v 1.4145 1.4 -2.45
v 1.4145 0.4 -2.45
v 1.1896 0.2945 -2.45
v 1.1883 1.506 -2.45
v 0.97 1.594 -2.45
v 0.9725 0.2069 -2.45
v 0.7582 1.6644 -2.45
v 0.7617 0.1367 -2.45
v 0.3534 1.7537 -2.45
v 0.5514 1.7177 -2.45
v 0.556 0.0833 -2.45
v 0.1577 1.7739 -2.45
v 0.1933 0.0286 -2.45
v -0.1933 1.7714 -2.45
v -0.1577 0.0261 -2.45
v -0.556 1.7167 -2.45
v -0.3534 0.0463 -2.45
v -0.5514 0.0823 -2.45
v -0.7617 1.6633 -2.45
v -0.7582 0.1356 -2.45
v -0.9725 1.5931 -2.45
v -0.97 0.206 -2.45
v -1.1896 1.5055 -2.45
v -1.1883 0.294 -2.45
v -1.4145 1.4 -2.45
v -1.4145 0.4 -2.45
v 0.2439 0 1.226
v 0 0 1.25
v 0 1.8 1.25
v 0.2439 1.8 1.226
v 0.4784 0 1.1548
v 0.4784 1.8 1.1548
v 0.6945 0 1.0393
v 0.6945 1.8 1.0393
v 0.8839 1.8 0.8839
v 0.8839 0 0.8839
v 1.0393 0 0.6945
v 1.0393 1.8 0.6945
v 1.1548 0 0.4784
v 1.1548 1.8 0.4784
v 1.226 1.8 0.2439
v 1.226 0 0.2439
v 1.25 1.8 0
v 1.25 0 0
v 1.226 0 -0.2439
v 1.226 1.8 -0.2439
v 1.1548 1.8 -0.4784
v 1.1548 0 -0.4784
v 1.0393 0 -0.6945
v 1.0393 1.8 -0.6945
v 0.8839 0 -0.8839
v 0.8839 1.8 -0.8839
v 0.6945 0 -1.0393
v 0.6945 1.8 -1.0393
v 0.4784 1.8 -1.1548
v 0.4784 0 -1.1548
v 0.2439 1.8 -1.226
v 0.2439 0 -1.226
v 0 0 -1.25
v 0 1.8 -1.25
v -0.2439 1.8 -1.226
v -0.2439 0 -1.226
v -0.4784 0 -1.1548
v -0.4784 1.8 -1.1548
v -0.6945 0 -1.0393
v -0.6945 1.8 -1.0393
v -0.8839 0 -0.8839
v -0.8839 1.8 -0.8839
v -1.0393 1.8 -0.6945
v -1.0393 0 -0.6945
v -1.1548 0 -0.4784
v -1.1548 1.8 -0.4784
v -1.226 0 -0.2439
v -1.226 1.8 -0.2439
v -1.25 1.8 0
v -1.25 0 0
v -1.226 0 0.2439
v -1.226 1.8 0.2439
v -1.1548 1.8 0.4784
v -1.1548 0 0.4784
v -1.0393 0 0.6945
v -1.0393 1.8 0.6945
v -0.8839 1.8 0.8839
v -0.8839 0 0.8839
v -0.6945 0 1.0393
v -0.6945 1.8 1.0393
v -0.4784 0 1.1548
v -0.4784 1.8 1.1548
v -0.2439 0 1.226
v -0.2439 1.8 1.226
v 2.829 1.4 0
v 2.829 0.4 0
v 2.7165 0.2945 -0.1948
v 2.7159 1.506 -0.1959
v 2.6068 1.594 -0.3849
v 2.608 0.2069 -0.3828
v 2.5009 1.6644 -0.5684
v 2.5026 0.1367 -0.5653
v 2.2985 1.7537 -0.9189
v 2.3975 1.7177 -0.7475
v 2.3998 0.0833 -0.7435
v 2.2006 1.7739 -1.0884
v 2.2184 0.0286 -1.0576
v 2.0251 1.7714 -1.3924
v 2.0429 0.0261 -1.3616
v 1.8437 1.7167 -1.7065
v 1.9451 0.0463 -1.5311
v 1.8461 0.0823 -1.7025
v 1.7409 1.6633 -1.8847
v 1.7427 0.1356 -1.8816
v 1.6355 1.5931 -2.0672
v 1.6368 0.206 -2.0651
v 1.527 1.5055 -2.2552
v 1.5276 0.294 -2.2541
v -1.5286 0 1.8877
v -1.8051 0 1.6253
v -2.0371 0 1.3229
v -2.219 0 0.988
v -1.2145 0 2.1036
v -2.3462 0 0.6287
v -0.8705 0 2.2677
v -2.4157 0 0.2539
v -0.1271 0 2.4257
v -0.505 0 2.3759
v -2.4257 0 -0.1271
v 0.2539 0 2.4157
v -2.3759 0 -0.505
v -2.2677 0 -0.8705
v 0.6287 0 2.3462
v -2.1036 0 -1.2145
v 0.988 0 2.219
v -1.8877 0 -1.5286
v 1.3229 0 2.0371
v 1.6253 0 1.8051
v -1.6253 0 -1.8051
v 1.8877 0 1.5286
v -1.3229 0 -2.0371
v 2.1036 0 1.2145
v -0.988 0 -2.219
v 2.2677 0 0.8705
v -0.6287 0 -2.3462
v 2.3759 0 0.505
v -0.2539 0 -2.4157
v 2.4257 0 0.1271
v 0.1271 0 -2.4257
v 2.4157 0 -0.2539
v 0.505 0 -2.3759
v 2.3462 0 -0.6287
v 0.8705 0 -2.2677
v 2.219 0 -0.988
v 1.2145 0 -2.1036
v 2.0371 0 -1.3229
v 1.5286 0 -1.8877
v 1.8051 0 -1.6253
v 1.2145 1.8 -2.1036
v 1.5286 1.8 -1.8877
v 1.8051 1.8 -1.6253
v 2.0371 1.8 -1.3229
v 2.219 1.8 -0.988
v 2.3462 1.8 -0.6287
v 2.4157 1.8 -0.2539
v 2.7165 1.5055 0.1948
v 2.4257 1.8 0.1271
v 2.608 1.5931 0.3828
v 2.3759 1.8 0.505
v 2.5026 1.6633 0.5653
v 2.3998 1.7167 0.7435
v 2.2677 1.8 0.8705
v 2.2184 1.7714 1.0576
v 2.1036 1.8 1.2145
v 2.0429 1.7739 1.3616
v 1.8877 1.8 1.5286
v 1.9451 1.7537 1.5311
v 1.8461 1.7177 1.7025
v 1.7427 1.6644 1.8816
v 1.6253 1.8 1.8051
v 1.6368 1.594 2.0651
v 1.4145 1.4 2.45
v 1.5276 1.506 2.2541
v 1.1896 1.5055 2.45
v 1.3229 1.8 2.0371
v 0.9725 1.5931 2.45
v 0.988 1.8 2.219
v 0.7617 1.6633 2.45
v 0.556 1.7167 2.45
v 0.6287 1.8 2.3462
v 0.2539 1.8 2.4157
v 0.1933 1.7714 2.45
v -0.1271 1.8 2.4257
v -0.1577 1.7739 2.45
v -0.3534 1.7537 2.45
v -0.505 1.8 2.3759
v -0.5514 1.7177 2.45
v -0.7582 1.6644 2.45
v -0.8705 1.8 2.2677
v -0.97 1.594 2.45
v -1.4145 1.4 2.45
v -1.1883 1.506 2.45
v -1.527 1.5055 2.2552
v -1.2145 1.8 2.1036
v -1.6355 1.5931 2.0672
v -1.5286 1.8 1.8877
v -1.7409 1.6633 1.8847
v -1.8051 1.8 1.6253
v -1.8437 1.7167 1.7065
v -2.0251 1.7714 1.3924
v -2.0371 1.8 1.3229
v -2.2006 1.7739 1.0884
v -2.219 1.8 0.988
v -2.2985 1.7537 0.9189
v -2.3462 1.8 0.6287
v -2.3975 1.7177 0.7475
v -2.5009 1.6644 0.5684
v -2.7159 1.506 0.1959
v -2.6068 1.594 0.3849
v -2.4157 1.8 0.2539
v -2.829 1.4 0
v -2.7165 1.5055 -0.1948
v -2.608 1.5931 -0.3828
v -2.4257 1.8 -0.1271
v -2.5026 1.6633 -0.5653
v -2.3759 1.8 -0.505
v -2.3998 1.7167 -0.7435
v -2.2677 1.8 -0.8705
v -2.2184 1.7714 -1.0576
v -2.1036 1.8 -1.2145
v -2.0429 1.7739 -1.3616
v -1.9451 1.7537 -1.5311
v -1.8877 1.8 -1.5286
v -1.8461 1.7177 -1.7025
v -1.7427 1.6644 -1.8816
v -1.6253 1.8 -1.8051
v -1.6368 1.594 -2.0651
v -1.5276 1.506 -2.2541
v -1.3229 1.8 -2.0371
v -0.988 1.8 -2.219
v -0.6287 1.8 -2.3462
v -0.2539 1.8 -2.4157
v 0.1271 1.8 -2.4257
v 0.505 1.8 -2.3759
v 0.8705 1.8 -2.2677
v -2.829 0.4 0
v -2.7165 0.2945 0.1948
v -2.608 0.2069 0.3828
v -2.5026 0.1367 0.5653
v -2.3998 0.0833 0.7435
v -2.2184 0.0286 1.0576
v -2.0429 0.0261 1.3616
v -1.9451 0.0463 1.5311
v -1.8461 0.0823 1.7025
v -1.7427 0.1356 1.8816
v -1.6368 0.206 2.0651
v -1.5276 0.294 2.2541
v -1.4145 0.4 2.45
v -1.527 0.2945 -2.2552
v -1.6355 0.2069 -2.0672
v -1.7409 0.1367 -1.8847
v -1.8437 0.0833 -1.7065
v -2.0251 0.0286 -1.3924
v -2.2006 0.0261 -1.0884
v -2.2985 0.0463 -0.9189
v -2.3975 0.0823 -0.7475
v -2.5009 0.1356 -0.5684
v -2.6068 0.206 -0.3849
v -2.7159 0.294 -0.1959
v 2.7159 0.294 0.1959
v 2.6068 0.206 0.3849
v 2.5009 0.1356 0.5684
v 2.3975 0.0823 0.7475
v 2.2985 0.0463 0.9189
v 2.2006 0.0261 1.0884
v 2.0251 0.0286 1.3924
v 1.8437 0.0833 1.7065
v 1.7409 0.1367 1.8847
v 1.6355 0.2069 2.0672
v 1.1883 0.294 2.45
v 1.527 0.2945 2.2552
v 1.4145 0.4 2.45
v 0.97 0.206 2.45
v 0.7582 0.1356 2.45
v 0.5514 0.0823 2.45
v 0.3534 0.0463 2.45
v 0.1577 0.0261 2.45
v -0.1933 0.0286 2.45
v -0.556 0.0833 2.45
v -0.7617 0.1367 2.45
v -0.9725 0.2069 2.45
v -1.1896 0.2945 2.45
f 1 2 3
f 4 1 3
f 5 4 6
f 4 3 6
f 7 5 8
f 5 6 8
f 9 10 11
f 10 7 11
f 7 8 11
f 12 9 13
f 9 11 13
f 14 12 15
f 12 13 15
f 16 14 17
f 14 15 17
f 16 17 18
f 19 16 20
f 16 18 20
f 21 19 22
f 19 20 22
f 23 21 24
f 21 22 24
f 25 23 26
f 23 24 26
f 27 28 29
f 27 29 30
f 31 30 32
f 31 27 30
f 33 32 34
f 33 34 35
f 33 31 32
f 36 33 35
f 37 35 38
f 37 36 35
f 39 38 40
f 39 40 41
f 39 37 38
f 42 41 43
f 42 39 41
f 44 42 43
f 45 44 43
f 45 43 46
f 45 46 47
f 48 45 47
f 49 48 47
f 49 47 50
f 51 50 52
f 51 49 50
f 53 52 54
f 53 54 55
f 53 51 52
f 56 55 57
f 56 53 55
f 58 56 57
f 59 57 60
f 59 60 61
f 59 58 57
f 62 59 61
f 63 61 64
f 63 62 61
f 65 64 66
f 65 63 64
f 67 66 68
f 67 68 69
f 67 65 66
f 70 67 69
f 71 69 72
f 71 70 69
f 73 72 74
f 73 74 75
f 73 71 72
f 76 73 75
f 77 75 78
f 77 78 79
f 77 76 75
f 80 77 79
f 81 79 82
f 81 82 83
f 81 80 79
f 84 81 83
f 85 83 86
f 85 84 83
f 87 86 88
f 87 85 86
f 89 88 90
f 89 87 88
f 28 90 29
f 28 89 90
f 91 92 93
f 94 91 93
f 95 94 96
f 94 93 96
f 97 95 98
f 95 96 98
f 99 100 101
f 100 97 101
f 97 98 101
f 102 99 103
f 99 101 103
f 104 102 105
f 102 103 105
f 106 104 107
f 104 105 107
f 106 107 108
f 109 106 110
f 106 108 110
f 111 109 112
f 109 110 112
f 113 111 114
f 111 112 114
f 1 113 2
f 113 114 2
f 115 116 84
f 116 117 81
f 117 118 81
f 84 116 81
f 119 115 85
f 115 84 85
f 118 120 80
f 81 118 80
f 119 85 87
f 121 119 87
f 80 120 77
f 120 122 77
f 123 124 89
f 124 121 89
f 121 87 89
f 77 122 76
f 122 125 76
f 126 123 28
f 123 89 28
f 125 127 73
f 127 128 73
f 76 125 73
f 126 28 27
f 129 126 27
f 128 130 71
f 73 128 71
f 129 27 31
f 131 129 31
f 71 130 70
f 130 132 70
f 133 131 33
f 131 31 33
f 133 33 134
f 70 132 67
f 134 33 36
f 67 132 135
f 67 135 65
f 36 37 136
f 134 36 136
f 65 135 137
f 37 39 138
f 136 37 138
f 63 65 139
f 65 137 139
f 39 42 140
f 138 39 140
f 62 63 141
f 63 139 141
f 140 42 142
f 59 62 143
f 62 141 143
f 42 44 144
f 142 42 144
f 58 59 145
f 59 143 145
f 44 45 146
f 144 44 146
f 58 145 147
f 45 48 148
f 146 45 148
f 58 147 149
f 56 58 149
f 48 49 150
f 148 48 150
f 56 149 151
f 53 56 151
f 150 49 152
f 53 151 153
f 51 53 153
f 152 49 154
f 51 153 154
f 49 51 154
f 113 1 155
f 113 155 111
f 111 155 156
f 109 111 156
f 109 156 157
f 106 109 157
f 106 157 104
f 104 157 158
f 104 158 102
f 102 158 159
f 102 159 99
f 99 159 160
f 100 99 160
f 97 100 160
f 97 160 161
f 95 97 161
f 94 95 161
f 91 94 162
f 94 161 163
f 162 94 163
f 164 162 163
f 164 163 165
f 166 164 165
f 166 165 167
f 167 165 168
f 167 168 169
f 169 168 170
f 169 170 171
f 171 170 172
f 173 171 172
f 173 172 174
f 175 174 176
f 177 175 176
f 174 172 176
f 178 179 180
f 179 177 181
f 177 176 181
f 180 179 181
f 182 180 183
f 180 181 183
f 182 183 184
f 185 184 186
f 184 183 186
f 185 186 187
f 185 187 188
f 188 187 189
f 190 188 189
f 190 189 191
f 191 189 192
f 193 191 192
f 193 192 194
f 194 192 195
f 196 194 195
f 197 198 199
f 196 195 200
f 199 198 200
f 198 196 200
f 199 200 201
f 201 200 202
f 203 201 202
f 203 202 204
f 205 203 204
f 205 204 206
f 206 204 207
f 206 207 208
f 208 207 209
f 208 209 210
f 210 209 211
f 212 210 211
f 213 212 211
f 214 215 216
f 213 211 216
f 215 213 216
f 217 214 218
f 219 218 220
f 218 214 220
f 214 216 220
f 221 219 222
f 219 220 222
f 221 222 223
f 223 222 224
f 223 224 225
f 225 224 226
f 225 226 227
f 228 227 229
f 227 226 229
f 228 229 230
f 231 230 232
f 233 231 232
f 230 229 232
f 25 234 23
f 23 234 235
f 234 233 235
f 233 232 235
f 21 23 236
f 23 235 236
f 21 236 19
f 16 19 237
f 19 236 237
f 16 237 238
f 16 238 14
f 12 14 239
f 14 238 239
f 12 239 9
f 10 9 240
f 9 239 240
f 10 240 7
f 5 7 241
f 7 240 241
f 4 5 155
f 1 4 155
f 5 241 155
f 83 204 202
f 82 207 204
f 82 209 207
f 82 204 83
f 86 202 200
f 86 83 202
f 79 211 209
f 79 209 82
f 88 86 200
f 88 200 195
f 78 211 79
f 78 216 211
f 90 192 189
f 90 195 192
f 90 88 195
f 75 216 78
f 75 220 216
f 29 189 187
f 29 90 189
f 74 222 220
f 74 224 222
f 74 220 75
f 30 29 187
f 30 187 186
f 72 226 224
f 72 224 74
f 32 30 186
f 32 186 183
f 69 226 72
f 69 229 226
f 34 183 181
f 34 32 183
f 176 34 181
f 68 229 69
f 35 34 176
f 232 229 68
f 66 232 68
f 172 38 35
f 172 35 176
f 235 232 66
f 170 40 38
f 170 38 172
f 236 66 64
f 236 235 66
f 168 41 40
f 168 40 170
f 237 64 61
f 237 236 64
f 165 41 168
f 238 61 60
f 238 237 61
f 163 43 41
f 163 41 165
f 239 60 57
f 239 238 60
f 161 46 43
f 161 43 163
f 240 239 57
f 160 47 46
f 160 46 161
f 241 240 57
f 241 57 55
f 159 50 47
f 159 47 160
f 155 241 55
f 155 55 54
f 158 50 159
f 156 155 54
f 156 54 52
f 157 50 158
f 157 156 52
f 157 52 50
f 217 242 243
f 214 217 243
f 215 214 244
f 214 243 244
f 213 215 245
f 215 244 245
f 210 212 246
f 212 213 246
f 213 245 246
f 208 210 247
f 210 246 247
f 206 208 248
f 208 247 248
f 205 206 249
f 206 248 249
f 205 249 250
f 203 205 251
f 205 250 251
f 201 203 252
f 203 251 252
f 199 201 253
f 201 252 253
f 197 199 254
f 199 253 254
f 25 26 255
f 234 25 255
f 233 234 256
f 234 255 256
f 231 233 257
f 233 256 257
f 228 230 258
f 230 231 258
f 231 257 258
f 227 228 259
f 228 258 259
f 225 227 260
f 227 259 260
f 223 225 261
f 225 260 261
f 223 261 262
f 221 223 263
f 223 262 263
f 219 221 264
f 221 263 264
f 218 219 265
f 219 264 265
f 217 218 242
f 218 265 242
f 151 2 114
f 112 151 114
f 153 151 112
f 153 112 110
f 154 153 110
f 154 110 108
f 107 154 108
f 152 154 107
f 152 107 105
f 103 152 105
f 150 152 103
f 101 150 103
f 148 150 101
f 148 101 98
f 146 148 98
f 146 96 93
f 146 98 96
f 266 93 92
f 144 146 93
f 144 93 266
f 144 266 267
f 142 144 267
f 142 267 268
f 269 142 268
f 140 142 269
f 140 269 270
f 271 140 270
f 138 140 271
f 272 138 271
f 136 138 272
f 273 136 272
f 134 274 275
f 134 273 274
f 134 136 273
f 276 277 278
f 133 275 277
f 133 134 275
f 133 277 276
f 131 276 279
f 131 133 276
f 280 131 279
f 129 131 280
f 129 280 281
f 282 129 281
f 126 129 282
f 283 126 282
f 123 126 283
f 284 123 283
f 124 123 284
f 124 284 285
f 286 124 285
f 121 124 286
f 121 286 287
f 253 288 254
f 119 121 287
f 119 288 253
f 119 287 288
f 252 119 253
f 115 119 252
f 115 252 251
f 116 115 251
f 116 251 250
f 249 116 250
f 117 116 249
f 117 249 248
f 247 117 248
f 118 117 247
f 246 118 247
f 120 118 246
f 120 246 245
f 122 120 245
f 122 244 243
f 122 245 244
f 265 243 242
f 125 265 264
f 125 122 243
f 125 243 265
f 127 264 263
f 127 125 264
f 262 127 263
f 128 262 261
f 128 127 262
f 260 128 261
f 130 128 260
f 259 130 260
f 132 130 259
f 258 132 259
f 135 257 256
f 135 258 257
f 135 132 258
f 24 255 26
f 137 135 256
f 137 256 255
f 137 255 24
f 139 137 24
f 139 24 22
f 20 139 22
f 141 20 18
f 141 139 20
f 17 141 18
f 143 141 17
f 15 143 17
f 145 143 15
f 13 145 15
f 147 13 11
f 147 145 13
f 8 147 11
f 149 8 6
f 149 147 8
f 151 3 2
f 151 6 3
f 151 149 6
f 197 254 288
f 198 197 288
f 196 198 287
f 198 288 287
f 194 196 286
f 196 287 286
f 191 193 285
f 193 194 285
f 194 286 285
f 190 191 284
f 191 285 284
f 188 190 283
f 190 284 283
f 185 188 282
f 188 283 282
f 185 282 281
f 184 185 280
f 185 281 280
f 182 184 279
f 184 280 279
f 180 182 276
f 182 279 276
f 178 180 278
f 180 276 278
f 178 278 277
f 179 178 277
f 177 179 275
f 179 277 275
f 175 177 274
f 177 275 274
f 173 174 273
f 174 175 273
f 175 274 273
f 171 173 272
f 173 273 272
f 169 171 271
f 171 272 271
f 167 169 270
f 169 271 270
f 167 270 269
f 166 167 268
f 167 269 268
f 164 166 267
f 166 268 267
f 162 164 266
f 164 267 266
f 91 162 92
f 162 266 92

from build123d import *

# Parameters (mm, degrees)
SKETCH1_R           = 1.25
BOSS_EXTRUDE1_DEPTH = 1.8


with BuildPart() as part:
    # Sketch1 → Boss-Extrude1 (new body)
    with BuildSketch(Plane(origin=(0, 0, 0), x_dir=(1, 0, 0), z_dir=(0, 1, 0))):
        Polygon((1.41450816, 2.45), (-1.41450816, 2.45), (-2.829016319, 0), (-1.41450816, -2.45), (1.41450816, -2.45), (2.829016319, 0), align=None)
        with Locations(Location((0, 0, 0), (0, 0, 270))):
            Circle(SKETCH1_R, mode=Mode.SUBTRACT)
    extrude(amount=BOSS_EXTRUDE1_DEPTH)

    # Sketch3 → Cut-Revolve2 (revolve, cut)
    with BuildSketch(Plane(origin=(0, 0, 0), x_dir=(-1, 0, 0), z_dir=(0, 0, -1)), mode=Mode.PRIVATE) as cut_revolve2_sk:
        Polygon((-2.829016319, 1.8), (-2.829016319, 1.4), (-2.429016319, 1.8), align=None)
    cut_revolve2 = revolve(cut_revolve2_sk.sketch.rotate(Axis((0, 1.89, 0), (0, -1, 0)), 300.000000777), axis=Axis((0, 1.89, 0), (0, -1, 0)), mode=Mode.SUBTRACT)

    # Mirror1: Cut-Revolve2 across plane
    add(cut_revolve2.mirror(Plane.ZX.offset(0.9)), mode=Mode.SUBTRACT)


solid = part.part
